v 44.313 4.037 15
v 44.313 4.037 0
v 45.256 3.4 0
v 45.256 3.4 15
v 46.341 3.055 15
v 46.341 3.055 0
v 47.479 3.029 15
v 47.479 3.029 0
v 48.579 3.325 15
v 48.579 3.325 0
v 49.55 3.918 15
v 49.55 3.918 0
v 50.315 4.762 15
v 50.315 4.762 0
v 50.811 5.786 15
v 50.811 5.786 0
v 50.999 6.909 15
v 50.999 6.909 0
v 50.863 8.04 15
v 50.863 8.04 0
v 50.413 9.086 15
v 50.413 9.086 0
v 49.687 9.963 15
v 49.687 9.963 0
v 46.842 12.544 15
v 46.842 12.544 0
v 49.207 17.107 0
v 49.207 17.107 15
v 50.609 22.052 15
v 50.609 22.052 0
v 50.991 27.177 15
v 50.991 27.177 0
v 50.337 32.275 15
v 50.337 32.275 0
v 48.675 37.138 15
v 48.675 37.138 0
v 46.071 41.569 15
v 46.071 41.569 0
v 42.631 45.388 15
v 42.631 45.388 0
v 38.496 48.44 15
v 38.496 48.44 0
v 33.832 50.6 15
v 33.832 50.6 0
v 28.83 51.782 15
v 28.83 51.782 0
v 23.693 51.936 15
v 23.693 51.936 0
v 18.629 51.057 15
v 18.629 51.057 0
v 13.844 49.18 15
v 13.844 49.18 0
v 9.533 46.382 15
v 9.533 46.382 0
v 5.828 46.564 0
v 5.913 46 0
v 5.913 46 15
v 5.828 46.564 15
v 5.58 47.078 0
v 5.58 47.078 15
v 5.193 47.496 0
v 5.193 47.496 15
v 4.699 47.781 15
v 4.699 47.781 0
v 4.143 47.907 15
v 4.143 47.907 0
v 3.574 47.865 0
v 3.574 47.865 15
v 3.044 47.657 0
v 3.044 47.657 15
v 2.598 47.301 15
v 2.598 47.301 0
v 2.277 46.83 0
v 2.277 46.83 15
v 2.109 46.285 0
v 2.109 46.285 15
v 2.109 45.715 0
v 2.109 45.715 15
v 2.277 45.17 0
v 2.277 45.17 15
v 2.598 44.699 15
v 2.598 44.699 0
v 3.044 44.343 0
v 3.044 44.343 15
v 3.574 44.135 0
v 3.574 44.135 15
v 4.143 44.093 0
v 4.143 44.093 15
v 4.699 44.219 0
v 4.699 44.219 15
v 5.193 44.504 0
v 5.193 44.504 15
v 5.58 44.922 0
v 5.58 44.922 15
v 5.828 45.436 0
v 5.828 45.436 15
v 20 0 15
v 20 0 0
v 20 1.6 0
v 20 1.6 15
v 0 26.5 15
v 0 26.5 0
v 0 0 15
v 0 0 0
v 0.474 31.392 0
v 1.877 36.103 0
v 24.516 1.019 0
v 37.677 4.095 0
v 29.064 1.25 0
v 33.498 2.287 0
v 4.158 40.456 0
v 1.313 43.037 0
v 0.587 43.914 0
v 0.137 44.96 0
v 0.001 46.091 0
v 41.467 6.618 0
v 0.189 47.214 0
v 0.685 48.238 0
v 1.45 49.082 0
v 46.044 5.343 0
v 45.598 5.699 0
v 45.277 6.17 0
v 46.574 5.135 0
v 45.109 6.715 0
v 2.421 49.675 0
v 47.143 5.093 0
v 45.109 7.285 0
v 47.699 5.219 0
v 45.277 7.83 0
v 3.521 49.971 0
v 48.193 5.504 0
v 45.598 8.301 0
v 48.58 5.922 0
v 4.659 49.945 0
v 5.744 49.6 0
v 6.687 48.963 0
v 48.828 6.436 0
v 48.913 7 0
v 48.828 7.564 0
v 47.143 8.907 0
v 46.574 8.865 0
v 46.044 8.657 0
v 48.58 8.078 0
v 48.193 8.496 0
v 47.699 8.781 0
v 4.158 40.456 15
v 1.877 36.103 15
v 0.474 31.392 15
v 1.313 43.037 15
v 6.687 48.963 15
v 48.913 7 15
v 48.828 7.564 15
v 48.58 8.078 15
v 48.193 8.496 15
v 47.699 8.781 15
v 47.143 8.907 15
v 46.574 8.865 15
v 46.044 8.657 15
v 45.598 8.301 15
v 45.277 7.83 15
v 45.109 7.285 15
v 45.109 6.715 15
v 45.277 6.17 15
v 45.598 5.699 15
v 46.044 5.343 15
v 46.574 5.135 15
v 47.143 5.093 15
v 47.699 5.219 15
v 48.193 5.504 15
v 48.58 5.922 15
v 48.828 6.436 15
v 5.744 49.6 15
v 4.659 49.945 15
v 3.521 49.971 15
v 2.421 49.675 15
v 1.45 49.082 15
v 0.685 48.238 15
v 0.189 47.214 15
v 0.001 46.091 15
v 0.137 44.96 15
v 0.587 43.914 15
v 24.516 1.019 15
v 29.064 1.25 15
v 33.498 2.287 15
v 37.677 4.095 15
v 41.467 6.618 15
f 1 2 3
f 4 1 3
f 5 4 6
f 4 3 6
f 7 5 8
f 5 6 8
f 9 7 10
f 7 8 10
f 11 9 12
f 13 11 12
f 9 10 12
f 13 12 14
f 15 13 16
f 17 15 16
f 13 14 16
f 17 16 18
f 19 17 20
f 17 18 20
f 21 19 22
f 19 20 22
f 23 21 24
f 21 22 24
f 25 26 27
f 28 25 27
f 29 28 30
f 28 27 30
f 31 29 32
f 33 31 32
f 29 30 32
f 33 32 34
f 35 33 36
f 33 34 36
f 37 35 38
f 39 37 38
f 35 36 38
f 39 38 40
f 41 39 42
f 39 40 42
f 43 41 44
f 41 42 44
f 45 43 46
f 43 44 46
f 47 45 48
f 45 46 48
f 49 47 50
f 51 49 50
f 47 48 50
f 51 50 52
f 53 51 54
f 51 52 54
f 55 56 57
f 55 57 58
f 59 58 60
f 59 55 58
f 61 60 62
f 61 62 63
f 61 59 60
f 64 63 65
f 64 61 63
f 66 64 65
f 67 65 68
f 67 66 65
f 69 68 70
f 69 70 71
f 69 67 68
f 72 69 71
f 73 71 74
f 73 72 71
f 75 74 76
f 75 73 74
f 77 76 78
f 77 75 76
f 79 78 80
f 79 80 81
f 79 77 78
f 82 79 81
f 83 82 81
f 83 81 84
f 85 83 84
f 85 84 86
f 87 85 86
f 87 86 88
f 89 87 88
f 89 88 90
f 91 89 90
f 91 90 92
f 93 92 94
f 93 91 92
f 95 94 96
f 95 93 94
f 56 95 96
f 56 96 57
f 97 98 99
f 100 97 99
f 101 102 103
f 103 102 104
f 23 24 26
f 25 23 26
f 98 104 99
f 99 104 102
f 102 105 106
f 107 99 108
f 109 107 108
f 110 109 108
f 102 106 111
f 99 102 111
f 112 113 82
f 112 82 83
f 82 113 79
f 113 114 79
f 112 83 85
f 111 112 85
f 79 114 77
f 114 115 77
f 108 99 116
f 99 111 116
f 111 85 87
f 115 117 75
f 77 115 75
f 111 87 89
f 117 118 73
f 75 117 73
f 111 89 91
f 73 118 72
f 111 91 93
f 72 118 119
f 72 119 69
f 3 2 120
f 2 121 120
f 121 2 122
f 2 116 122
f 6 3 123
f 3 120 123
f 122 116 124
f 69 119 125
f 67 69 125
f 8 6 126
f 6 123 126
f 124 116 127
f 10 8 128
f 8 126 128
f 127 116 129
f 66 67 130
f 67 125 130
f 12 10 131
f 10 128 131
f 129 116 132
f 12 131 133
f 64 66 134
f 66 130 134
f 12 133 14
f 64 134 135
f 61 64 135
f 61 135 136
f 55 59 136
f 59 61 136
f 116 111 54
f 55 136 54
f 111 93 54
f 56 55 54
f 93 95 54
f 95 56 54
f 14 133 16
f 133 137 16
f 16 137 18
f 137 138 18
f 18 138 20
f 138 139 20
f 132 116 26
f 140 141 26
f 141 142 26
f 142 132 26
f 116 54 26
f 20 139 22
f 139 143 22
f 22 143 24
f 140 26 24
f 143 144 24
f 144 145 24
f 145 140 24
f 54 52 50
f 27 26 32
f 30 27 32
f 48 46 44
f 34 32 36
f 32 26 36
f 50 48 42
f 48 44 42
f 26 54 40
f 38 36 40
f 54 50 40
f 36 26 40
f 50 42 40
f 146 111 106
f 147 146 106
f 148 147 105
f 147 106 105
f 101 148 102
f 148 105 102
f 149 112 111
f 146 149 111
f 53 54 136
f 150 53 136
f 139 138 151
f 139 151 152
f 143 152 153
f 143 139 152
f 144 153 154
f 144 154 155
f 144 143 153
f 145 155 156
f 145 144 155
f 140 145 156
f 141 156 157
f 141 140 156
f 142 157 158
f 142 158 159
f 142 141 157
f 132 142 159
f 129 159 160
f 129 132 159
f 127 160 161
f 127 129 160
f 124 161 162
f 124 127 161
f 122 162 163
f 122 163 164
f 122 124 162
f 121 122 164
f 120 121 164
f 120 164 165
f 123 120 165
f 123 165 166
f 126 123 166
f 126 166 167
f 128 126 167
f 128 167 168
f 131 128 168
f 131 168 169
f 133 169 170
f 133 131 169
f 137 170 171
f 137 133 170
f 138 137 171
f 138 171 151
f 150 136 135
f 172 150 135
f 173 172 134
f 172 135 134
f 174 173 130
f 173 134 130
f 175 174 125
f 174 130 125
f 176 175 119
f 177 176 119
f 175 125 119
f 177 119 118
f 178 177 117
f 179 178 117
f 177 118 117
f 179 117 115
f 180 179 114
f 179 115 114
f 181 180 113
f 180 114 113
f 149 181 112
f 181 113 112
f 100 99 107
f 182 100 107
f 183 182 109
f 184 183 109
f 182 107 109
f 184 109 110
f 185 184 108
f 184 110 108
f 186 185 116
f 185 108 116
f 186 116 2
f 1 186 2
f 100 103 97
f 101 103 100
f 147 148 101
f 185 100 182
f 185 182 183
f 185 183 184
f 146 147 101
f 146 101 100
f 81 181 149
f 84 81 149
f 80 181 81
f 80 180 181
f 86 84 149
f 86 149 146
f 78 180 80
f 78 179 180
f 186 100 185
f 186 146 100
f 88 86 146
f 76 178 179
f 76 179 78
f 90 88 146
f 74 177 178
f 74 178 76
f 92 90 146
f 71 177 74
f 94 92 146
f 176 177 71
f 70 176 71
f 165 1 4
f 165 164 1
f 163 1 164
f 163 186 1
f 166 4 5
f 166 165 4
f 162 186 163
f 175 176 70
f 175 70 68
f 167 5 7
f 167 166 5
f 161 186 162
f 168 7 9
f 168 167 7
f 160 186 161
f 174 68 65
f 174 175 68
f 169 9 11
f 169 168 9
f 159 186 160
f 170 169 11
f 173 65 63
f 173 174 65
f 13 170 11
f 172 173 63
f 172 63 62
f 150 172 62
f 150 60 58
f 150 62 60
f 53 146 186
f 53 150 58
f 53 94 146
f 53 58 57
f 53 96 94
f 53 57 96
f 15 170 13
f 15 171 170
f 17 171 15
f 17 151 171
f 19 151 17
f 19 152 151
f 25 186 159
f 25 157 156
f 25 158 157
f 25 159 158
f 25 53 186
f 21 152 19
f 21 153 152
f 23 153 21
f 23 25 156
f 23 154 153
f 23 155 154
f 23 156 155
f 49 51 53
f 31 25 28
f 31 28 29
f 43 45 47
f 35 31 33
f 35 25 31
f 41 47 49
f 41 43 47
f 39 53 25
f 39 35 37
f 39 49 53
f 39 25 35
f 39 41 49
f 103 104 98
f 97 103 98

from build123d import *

# Parameters (mm, degrees)
SKETCH_2_R      = 1.912823122
EXTRUDE_1_DEPTH = 15


with BuildPart() as part:
    # Эскиз2 → Бобышка-Вытянуть1 (new body)
    with BuildSketch(Plane.XY):
        with BuildLine():
            ThreePointArc((44.312740246, 4.037123861), (49.962876139, 4.312740246), (49.687259754, 9.962876139))
            Line((49.687259754, 9.962876139), (46.841765339, 12.543673399))
            ThreePointArc((46.841765339, 12.543673399), (42.631280931, 45.388335386), (9.532754169, 46.382078879))
            Line((9.532754169, 46.382078879), (6.687259754, 48.962876139))
            ThreePointArc((6.687259754, 48.962876139), (1.037123861, 48.687259754), (1.312740246, 43.037123861))
            Line((1.312740246, 43.037123861), (4.158234661, 40.456326601))
            ThreePointArc((4.158234661, 40.456326601), (1.061659056, 33.78131114), (0, 26.5))
            Line((0, 26.5), (0, 0))
            Line((0, 0), (20, 0))
            Line((20, 0), (20, 1.600200804))
            ThreePointArc((20, 1.600200804), (31.30389422, 1.669276855), (41.467245831, 6.617921121))
            Line((41.467245831, 6.617921121), (44.312740246, 4.037123861))
        make_face()
        with Locations((47, 7)):
            Circle(SKETCH_2_R, mode=Mode.SUBTRACT)
        with Locations((4, 46)):
            Circle(SKETCH_2_R, mode=Mode.SUBTRACT)
    extrude(amount=EXTRUDE_1_DEPTH)


solid = part.part
